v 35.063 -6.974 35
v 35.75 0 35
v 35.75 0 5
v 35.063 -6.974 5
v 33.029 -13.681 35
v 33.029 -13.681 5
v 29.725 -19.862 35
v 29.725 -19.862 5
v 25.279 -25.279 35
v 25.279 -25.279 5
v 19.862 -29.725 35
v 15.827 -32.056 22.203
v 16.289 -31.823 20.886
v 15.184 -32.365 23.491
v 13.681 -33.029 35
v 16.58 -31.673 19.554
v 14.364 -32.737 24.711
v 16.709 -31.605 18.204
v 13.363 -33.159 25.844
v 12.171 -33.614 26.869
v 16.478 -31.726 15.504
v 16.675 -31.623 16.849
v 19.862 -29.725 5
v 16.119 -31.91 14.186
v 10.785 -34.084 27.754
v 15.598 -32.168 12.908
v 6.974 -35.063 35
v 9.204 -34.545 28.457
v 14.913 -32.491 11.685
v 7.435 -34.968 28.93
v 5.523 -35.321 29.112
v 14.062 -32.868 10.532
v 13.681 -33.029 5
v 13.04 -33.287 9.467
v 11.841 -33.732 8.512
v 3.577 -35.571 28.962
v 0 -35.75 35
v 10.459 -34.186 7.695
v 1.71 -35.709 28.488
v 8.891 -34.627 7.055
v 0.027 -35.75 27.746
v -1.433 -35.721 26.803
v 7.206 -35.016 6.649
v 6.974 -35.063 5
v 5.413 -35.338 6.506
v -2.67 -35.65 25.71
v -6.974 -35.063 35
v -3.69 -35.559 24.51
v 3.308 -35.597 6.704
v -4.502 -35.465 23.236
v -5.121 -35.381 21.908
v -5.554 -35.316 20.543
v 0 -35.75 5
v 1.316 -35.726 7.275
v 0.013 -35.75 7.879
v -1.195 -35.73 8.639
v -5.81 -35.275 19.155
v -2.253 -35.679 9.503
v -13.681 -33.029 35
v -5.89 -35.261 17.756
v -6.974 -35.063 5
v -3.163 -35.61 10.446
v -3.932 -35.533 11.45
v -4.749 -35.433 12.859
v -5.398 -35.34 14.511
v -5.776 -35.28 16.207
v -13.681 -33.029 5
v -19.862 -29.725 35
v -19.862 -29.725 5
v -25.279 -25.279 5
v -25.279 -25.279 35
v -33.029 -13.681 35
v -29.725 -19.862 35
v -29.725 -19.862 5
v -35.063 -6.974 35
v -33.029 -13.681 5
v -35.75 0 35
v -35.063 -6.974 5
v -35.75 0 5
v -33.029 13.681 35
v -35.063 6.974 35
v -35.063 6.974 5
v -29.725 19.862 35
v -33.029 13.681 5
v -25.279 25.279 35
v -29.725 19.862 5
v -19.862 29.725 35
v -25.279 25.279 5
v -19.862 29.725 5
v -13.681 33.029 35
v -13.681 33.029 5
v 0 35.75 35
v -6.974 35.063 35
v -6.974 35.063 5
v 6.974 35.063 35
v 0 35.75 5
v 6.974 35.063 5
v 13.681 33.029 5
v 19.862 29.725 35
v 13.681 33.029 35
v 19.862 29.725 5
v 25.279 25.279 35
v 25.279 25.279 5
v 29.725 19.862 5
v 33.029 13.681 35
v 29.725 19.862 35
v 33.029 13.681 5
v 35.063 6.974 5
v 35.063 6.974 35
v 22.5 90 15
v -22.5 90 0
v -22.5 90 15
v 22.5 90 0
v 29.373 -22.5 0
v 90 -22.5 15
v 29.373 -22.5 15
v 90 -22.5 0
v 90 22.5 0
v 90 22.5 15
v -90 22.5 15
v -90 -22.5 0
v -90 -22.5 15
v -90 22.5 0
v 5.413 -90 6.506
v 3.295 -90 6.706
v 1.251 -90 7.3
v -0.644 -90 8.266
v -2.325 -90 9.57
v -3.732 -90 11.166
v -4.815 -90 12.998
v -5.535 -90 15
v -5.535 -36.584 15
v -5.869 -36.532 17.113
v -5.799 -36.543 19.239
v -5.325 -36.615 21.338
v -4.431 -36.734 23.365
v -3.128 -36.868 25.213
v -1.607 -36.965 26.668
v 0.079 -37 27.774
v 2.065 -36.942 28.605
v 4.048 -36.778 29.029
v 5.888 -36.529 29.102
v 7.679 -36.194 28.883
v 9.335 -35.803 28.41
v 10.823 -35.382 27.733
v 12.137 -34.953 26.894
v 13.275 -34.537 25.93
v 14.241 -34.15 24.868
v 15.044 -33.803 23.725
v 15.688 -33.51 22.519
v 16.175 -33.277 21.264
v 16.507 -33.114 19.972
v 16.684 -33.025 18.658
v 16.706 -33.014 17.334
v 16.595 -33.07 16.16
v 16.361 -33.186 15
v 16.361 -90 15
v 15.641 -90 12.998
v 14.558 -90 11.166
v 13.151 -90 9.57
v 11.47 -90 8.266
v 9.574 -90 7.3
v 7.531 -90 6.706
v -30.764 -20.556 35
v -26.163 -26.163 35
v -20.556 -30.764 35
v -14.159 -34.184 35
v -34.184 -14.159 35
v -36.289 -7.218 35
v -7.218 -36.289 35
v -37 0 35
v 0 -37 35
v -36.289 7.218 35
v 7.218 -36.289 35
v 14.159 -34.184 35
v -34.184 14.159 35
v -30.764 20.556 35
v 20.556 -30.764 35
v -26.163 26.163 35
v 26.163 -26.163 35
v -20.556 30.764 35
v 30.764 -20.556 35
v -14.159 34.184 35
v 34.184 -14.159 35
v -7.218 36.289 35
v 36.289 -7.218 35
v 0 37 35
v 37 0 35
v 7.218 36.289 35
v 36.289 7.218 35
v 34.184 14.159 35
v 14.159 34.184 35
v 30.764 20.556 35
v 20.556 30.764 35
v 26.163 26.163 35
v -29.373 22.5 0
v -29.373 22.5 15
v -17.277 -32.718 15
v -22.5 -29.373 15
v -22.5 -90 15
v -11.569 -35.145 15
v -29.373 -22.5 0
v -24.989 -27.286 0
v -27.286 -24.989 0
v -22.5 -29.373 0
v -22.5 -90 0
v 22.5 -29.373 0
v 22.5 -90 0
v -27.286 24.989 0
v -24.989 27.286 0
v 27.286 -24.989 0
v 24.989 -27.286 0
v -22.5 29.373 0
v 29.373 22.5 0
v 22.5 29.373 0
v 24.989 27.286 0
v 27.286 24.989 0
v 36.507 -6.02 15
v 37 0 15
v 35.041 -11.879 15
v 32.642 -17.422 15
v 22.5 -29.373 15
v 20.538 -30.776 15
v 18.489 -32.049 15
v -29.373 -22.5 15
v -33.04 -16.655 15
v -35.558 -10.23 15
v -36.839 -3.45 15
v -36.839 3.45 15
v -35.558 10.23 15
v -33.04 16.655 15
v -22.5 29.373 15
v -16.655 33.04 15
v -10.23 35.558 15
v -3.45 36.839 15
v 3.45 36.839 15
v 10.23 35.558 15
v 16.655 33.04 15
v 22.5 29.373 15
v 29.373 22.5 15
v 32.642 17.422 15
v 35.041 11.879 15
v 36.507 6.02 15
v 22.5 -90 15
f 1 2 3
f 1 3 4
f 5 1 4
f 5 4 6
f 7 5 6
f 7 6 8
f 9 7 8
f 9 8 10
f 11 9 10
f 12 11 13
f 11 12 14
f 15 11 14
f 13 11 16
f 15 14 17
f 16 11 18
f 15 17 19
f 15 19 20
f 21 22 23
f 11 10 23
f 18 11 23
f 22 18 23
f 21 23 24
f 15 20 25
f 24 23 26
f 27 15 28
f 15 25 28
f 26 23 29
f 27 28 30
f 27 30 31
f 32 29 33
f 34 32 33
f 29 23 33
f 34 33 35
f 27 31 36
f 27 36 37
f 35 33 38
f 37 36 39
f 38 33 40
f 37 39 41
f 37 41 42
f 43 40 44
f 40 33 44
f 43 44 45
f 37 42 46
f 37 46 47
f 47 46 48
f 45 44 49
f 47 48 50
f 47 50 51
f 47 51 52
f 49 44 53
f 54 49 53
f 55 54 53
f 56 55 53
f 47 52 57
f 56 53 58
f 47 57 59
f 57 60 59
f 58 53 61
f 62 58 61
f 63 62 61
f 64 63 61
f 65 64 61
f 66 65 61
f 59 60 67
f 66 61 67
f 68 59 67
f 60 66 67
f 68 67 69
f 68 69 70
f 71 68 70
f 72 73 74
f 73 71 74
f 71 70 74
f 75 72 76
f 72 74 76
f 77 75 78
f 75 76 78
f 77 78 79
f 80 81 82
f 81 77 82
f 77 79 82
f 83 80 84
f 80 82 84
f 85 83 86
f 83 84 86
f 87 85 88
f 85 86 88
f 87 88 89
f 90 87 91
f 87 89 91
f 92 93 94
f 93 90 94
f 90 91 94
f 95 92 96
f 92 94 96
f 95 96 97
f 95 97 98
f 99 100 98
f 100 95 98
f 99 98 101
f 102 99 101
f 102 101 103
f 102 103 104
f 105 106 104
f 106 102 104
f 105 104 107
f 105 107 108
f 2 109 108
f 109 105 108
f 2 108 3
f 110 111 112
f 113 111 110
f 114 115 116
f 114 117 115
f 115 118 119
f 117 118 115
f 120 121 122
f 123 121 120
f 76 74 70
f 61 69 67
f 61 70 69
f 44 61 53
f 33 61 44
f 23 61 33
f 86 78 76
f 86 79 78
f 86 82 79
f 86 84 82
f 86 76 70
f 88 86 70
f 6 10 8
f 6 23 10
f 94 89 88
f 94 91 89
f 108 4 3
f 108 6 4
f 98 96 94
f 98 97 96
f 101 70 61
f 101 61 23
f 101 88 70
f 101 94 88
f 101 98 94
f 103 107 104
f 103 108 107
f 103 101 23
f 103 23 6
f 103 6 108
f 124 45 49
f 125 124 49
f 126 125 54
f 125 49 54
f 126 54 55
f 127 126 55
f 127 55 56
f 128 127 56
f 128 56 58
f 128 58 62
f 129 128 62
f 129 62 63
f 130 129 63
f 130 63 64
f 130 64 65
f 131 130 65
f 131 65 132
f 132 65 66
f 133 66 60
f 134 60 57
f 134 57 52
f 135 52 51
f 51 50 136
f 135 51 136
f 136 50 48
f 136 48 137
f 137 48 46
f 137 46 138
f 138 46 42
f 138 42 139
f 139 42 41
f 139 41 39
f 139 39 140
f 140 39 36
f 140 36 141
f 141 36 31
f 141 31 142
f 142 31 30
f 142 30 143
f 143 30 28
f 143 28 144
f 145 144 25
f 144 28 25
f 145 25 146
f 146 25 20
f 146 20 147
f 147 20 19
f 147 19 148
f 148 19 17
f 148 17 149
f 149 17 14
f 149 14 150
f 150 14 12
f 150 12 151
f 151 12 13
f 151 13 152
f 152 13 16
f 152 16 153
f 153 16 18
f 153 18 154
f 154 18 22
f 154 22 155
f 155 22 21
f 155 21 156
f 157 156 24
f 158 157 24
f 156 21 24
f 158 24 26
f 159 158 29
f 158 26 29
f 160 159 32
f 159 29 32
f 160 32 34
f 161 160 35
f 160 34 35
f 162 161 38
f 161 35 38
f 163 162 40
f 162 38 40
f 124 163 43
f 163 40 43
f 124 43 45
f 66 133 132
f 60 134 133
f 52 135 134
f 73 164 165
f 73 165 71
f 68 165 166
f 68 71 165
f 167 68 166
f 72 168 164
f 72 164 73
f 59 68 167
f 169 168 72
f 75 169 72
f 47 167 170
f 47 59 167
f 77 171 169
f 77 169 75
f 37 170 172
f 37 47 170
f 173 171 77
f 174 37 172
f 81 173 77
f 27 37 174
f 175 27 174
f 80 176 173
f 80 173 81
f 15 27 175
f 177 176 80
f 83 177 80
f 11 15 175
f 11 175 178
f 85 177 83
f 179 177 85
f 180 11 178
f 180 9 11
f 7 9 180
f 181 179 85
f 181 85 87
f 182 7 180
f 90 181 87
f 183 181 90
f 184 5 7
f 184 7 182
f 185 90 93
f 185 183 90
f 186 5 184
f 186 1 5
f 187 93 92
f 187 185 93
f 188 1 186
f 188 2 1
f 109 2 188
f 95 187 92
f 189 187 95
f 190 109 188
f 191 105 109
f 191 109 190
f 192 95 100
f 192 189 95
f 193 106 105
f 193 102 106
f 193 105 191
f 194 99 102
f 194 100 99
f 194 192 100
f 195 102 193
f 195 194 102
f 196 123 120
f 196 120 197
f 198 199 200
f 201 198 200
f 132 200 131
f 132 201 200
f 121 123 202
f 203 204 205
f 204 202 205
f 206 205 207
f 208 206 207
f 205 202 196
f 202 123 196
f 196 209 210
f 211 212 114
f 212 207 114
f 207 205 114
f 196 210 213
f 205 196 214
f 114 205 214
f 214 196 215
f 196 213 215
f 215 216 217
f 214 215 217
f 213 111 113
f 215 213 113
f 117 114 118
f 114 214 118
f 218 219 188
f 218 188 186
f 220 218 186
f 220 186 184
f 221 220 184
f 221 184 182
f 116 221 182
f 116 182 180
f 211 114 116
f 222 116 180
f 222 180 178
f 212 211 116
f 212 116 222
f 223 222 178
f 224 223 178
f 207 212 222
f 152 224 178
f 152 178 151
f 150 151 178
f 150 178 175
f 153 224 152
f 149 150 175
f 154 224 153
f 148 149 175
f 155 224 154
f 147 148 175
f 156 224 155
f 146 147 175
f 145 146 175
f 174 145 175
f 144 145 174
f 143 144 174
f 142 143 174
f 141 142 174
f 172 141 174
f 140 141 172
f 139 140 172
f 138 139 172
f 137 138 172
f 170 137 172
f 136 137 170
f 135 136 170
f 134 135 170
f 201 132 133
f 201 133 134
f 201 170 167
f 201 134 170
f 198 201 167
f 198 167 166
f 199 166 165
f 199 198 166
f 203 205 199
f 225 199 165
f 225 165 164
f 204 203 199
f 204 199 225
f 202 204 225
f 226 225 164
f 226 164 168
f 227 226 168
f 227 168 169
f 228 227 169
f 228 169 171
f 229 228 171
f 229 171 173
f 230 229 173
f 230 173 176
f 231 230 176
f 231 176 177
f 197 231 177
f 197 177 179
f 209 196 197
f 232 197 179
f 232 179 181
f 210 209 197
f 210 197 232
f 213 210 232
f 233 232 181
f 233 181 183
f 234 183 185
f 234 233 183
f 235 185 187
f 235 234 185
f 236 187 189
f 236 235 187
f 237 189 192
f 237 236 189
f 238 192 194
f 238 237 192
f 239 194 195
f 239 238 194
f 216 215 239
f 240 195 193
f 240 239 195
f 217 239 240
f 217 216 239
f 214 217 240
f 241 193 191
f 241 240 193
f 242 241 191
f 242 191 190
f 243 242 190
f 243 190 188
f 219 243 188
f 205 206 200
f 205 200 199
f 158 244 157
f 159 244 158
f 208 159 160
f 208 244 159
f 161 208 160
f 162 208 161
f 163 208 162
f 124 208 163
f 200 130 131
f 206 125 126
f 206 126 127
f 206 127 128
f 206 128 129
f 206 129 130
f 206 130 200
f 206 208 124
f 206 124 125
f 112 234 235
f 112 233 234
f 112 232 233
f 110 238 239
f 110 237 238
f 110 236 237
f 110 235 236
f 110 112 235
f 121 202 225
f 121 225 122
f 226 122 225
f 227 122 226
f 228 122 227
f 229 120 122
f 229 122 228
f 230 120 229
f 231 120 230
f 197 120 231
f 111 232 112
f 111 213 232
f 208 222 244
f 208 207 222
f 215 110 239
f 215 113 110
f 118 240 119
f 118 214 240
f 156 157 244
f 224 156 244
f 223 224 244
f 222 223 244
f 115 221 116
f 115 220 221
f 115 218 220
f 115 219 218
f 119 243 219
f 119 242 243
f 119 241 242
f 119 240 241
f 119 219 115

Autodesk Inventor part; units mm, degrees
ref_plane "YZ Plane" through (0, 0, 0) normal (1, 0, 0) x (0, 1, 0)
ref_plane "XZ Plane" through (0, 0, 0) normal (0, 1, 0) x (-1, 0, 0)
ref_plane "XY Plane" through (0, 0, 0) normal (0, 0, 1) x (1, 0, 0)
sketch "Sketch1" plane through (0, 0, 0) normal (0, 0, 1) x (1, 0, 0)
  circle A0 centre (0, 0) radius 35.75
  circle A1 centre (0, 0) radius 37
  line L0 (-22.5, -90) -> (-22.5, 90)
  line L1 (-22.5, 90) -> (22.5, 90)
  line L2 (22.5, 90) -> (22.5, -90)
  line L3 (22.5, -90) -> (-22.5, -90)
  line L4 (-22.5, -90) -> (22.5, 90) construction
  line L5 (-22.5, 90) -> (22.5, -90) construction
  line L6 (-90, 22.5) -> (90, 22.5)
  line L7 (90, 22.5) -> (90, -22.5)
  line L8 (90, -22.5) -> (-90, -22.5)
  line L9 (-90, -22.5) -> (-90, 22.5)
  line L10 (-90, 22.5) -> (90, -22.5) construction
  line L11 (90, 22.5) -> (-90, -22.5) construction
  point P0 (22.5, -29.3726)
  point P1 (-22.5, -29.3726)
  point P2 (-29.3726, -22.5)
  point P3 (-29.3726, 22.5)
  point P4 (-22.5, 29.3726)
  point P5 (22.5, 29.3726)
  point P6 (29.3726, 22.5)
  point P7 (29.3726, -22.5)
  dimension "d0" = 71.5
  dimension "d1" = 74
  dimension "d2" = 180
  dimension "d3" = 45
  dimension "d4" = 180
  dimension "d5" = 45
extrude "Extrusion1" add sketch "Sketch1" along normal blind 5 contours A0 L8 L2 L6 | L6 L2 A0 | A0 L2 L8 | L2 L6 L0 A0 | L2 L8 L0 L6 | A0 L0 L8 L2 | L0 L6 A0 | L0 L8 A0 L6 | A0 L8 L0
extrude "Extrusion2" add sketch "Sketch1" along normal blind 30 contours A0 L6 A1 L8 | A0 L2 A1 L6 | L8 A1 L2 A0 | A0 L0 A1 L2 | L2 A1 L0 A0 | A0 L6 A1 L0 | L0 A1 L8 A0 | A0 L8 A1 L6
extrude "Extrusion3" add sketch "Sketch1" along normal blind 15 contours L6 L7 L8 A1 | A1 L0 L1 L2 | L2 L3 L0 A1 | A1 L8 L9 L6
sketch "Sketch2" plane through (-22.5, -90, 0) normal (0, -1, 0) x (1, 0, 0)
  point P0 (22.5, 0)
  point P1 (27.9129, 17.8091)
hole "Hole1" at (5.4129, -90, 17.8091) direction (0, 1, 0) diameter 22.606 depth 88.75 tip angle 118
move faces "Move1" translate (0, 0, 5) faces at (-36.0055, 0, 30)
equation "\"BendRadius\" = Thickness"
equation "\"BendReliefWidth\" = Thickness"
equation "\"BendReliefDepth\" = 0.5 * Thickness"
equation "\"CornerReliefSize\" = 4 * Thickness"
equation "\"MinimumRemnant\" = 2 * Thickness"
equation "\"TransitionRadius\" = BendRadius"
equation "\"JacobiRadiusSize\" = BendRadius"
equation "\"GapSize\" = Thickness"
equation "\"Thickness\" = 0.5"
